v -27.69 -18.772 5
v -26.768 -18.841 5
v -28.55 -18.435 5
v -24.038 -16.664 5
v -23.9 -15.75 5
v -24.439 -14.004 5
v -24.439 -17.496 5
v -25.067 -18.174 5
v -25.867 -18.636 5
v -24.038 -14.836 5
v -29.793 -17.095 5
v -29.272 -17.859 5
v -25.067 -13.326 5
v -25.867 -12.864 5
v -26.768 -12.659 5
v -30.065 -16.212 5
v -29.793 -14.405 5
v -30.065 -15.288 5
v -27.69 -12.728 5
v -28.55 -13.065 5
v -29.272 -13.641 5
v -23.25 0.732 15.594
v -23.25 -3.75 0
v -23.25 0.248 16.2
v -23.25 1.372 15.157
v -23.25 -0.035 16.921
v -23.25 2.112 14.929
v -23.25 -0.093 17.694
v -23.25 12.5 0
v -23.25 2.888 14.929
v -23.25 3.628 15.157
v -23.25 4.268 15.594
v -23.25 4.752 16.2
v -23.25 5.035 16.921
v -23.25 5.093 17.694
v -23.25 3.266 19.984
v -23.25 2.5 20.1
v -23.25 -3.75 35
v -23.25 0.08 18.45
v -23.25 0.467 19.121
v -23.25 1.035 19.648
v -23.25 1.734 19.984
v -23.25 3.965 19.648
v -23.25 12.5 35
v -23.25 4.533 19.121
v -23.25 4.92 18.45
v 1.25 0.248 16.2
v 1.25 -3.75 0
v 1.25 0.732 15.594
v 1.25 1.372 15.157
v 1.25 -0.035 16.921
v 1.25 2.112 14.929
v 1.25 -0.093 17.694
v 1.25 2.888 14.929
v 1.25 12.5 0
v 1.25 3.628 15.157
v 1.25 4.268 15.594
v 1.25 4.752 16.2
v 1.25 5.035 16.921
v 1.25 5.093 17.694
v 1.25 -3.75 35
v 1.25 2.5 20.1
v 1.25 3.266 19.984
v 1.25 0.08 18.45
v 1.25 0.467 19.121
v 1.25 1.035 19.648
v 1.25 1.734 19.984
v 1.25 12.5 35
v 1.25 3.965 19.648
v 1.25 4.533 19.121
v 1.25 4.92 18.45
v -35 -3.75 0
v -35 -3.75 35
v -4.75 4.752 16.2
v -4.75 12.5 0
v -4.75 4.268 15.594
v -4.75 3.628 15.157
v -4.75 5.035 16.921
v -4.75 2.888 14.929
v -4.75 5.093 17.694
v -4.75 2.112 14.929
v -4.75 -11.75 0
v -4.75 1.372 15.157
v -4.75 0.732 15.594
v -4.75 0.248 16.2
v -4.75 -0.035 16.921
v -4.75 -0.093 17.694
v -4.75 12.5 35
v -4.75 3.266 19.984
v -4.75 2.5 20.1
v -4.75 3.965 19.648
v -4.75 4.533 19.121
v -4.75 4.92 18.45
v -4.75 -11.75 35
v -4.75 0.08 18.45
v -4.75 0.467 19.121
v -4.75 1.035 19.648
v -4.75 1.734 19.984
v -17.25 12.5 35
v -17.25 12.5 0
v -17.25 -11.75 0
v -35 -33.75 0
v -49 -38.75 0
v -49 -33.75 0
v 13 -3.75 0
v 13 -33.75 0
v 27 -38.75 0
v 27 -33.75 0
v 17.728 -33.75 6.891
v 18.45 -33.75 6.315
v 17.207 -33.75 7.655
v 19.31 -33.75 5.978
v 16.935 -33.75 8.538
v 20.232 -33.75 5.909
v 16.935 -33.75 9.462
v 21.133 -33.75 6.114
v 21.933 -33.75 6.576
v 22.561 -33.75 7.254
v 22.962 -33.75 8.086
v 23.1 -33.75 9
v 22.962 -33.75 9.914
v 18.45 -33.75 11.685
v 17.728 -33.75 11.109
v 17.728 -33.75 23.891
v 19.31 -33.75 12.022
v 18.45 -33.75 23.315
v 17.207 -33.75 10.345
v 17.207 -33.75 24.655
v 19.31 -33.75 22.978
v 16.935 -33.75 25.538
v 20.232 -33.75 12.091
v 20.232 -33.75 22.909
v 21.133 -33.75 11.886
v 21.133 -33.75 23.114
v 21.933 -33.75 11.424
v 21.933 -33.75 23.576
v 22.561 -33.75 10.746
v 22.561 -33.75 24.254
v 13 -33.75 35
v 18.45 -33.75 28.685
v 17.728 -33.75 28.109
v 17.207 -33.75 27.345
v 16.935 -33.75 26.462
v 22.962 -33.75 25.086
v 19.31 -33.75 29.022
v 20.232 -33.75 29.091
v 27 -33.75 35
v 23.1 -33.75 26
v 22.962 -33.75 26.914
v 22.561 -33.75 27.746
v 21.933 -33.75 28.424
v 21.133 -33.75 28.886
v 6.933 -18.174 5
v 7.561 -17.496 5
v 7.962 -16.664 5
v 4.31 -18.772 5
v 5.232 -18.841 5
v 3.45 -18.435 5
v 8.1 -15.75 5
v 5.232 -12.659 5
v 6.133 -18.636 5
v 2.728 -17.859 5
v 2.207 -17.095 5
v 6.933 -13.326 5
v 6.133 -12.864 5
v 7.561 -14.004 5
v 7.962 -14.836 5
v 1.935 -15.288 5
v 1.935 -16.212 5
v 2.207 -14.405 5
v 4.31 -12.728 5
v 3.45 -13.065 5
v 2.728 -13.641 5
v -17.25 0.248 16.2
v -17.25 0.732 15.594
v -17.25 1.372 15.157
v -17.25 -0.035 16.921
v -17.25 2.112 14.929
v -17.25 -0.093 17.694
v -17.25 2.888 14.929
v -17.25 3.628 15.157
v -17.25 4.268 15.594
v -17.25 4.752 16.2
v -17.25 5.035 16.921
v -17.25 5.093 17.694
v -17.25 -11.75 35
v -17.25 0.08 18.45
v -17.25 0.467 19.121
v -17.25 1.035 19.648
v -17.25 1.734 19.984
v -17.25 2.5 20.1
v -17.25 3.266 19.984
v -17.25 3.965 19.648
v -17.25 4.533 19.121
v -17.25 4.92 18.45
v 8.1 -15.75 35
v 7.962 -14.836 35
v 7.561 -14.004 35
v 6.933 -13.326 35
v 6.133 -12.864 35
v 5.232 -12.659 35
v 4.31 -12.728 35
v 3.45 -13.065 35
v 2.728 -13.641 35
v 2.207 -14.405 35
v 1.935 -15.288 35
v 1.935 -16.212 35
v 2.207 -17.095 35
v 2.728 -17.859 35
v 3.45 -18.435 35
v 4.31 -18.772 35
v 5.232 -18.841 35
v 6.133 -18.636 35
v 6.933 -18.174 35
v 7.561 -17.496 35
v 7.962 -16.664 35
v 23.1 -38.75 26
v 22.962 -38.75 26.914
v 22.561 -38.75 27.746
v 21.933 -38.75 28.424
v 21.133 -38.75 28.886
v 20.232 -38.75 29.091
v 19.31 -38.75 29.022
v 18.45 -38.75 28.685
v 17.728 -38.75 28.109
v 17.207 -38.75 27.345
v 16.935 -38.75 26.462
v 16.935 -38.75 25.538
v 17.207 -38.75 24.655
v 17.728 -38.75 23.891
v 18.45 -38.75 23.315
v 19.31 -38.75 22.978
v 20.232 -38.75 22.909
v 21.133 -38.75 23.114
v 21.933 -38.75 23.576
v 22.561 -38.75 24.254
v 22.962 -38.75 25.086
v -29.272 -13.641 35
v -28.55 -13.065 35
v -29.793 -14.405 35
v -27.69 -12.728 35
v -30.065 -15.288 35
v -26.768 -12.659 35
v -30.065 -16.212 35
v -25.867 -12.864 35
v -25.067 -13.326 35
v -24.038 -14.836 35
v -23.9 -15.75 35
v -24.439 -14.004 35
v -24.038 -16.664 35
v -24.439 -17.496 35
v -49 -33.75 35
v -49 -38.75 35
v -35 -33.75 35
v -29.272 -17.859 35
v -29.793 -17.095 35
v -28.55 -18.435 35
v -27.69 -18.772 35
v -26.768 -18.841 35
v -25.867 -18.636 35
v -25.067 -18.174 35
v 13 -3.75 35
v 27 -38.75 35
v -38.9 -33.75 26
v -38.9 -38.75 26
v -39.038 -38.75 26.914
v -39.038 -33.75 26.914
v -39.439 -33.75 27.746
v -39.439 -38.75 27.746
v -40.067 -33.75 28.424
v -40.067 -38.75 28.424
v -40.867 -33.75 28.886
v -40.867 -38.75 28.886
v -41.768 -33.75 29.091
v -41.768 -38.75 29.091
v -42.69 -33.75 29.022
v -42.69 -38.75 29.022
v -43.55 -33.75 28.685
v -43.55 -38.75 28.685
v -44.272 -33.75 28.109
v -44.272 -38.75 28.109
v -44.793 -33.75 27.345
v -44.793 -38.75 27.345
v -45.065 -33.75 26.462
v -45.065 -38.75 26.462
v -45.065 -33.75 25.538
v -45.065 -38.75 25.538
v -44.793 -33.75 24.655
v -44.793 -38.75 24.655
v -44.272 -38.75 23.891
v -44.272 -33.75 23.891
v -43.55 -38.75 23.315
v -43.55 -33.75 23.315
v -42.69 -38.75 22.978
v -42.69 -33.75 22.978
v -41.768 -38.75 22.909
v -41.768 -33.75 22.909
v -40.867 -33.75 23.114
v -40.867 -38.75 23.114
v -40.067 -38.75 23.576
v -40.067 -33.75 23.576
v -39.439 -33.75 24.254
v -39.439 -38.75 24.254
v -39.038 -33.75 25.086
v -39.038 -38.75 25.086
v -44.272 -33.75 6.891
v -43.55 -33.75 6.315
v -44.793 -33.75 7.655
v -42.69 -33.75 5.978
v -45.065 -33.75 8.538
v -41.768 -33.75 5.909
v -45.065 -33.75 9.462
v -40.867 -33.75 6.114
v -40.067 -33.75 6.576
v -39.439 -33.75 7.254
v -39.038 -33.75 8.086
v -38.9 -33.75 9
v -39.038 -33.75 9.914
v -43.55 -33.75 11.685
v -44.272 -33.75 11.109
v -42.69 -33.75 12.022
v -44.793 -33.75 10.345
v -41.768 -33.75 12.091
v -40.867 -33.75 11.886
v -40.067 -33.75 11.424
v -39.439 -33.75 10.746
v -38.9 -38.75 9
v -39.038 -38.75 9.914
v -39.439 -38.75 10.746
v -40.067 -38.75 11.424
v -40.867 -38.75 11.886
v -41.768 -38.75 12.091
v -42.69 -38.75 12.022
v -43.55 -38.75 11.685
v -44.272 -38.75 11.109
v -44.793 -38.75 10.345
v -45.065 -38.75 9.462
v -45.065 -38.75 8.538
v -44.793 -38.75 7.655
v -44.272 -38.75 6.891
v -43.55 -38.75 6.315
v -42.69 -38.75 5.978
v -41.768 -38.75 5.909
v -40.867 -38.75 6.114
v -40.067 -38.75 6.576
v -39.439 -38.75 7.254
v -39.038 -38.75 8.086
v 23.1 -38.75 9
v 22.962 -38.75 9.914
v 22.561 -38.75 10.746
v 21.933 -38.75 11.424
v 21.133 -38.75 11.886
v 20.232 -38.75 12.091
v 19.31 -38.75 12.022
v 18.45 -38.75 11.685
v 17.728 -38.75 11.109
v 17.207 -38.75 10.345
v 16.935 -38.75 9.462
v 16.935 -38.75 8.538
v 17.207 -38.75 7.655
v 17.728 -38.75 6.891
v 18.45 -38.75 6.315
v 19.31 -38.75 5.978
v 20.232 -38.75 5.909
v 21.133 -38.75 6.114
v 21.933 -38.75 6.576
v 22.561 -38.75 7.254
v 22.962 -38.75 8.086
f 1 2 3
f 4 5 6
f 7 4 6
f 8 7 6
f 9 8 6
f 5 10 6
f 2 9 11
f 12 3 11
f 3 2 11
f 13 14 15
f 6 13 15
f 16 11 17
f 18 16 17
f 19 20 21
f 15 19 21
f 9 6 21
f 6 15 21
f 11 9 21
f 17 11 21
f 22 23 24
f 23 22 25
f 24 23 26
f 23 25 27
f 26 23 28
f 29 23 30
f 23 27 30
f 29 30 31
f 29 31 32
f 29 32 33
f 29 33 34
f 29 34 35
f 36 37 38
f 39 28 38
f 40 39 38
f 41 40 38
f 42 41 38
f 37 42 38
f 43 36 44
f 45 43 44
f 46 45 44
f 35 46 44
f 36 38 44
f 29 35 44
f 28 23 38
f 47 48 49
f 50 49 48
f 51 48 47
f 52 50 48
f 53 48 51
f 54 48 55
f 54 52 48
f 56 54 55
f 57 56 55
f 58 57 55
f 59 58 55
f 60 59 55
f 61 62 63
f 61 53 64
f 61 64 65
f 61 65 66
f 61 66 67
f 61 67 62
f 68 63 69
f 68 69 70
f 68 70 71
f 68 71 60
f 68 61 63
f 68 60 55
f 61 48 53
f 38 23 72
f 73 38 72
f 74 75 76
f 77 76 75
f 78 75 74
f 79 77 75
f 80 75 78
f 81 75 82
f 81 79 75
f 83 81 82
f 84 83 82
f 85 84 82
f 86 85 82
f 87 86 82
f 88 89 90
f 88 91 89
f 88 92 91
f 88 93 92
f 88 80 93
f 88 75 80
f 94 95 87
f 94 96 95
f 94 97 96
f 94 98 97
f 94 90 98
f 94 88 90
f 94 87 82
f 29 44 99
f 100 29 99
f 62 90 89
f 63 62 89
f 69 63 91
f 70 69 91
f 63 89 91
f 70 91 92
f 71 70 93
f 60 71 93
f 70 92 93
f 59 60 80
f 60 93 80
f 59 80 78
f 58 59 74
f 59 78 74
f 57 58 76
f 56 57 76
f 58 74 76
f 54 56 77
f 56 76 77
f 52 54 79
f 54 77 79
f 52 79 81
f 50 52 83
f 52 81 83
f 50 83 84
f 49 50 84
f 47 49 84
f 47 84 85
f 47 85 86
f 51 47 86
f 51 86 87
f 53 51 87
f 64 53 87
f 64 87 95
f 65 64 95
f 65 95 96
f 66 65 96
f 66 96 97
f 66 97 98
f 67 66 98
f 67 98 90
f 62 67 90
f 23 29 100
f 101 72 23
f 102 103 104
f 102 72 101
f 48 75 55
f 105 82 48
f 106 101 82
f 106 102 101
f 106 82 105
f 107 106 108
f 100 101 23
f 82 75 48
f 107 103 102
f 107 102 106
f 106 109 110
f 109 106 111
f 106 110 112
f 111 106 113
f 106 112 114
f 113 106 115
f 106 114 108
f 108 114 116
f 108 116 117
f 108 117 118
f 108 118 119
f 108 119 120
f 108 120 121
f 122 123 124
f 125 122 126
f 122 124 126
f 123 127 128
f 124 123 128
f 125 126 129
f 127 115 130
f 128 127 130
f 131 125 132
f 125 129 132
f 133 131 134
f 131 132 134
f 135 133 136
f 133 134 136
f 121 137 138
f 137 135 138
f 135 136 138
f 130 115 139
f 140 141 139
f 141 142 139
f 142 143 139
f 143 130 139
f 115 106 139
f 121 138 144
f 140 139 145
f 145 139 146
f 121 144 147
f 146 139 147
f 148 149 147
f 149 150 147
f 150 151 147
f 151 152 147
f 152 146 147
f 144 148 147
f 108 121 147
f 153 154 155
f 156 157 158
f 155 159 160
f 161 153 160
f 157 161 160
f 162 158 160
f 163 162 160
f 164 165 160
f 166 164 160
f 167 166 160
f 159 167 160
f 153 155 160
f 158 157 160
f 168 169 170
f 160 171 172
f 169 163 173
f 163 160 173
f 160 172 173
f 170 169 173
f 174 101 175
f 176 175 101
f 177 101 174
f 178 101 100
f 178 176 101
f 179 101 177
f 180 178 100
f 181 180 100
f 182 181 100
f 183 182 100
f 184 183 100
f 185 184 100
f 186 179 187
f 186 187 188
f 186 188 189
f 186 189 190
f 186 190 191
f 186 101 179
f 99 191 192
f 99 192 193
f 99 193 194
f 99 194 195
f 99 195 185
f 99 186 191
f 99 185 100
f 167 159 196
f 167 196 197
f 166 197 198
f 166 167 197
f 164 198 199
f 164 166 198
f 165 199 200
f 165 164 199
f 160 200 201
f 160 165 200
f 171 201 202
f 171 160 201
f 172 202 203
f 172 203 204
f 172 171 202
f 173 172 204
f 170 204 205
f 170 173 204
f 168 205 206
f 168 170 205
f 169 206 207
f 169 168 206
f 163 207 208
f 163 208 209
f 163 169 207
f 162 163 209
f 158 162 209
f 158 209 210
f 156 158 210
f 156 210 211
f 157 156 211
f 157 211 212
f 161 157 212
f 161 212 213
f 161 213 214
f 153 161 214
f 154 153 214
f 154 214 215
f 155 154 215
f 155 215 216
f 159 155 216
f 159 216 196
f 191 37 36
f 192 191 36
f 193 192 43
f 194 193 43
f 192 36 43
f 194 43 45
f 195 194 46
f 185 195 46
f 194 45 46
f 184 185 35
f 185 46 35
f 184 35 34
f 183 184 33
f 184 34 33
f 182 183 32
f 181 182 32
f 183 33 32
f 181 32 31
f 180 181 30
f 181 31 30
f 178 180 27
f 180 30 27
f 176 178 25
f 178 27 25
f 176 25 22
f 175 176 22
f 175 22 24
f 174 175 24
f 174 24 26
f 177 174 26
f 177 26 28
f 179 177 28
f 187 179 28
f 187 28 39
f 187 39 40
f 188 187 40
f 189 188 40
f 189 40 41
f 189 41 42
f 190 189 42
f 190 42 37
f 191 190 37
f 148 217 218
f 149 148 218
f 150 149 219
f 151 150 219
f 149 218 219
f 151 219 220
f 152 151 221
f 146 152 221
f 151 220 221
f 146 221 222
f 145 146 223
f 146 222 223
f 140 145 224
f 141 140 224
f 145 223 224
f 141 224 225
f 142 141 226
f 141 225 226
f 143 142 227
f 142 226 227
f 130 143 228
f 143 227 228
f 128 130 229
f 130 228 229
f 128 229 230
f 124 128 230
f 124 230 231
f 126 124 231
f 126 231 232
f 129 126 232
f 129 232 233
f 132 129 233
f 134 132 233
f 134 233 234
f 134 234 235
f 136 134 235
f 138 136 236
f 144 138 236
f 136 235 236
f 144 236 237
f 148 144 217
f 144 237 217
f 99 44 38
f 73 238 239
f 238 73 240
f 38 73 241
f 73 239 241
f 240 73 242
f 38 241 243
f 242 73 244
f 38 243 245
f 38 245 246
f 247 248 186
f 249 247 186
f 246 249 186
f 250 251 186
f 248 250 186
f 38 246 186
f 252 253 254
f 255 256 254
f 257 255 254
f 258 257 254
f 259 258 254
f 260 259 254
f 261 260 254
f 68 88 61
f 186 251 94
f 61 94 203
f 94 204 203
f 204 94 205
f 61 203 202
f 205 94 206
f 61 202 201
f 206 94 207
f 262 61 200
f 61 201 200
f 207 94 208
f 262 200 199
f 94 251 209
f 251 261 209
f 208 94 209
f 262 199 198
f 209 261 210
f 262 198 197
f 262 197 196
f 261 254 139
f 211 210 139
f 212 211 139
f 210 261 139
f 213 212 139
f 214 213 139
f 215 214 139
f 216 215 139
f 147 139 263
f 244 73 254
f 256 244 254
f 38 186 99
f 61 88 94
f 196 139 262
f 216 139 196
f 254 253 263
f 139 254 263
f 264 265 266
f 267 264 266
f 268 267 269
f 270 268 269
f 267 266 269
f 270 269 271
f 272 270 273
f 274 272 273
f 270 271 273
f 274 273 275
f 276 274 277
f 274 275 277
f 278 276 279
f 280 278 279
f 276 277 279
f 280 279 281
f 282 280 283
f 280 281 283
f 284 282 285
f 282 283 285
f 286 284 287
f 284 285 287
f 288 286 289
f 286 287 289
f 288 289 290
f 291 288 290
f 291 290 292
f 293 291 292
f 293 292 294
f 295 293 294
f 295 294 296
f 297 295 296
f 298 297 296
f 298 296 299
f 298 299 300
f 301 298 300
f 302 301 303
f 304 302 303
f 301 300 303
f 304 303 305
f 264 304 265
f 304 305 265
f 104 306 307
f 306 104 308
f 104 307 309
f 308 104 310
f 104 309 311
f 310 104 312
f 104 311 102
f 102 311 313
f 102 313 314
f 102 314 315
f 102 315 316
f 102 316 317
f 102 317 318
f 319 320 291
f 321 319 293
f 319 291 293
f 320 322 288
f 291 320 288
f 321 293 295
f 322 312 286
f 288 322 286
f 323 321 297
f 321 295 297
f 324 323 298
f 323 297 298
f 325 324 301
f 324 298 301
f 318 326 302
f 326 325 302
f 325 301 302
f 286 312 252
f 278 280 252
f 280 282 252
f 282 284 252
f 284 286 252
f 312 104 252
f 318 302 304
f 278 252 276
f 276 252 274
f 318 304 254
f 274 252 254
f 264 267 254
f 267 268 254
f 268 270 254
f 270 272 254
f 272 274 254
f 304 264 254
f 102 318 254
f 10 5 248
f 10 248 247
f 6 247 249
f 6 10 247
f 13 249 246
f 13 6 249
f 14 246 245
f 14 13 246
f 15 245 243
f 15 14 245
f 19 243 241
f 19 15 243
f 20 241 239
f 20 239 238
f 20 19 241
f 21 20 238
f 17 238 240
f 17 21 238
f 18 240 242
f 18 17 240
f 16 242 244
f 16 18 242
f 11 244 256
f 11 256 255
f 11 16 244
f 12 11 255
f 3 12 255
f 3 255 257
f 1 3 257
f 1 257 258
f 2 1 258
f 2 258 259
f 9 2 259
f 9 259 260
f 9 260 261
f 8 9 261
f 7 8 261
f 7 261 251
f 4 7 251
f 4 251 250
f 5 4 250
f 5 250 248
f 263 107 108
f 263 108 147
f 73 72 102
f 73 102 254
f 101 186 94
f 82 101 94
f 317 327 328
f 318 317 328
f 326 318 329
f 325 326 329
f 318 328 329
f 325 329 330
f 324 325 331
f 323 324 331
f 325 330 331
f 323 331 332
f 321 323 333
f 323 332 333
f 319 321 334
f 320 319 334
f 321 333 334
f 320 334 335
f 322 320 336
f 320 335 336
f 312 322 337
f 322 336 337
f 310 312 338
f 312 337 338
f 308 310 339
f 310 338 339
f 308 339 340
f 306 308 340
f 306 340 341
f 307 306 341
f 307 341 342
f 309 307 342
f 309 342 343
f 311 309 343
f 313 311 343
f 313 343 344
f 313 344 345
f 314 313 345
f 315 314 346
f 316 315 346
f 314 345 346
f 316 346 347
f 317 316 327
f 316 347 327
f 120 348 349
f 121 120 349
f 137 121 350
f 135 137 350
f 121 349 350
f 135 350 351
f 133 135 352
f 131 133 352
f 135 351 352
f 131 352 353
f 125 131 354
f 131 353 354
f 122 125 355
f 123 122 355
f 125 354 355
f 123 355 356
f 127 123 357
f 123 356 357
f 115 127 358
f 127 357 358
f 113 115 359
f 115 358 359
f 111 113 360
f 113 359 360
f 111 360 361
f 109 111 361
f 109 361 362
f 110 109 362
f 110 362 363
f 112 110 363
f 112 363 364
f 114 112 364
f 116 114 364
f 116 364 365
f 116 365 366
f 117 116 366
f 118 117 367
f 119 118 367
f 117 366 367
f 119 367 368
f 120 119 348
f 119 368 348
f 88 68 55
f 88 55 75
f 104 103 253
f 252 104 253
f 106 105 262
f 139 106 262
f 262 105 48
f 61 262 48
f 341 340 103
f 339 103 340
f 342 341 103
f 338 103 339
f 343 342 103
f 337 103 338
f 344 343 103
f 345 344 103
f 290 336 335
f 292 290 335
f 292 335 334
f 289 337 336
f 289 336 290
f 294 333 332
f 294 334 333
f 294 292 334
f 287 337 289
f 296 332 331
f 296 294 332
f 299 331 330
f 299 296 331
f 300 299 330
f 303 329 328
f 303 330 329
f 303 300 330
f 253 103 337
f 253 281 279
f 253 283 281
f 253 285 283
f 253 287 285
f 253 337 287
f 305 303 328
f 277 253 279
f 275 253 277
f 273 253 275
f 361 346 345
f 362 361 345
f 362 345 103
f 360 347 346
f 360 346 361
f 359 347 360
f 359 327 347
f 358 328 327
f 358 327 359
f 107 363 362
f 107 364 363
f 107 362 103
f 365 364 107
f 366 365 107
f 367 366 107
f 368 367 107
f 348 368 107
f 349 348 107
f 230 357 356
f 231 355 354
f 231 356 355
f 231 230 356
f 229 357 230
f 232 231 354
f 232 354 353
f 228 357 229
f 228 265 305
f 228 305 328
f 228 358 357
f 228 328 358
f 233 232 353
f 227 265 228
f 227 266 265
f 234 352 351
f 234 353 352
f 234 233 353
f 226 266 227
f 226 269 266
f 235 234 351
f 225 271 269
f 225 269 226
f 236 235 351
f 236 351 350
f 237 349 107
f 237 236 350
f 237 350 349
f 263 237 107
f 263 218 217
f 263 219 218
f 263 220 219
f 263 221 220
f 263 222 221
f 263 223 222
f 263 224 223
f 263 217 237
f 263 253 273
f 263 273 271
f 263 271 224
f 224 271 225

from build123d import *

# Parameters (mm, degrees)
SKETCH1_R           = 3.1
BOSS_EXTRUDE1_DEPTH = 35
SKETCH2_R           = 3.1
BOSS_EXTRUDE2_DEPTH = 5
BOSS_EXTRUDE3_DEPTH = 35
SKETCH4_R           = 2.6
CUT_EXTRUDE1_DEPTH  = 37.25
SKETCH6_W           = 12.5
SKETCH6_H           = 8
CUT_EXTRUDE2_DEPTH  = 36
SKETCH7_W           = 48
SKETCH7_H           = 35
BOSS_EXTRUDE4_DEPTH = 10
SKETCH8_W           = 14
SKETCH8_H           = 35
SKETCH8_R           = 3.1
BOSS_EXTRUDE5_DEPTH = 5


with BuildPart() as part:
    # Sketch1 → Boss-Extrude1 (new body)
    with BuildSketch(Plane.XY):
        Polygon((-5, -3.75), (-35, -3.75), (-35, -28.75), (13, -28.75), (13, -3.75), align=None)
        with Locations((5, -15.75)):
            Circle(SKETCH1_R, mode=Mode.SUBTRACT)
        with Locations((-27, -15.75)):
            Circle(SKETCH1_R, mode=Mode.SUBTRACT)
    extrude(amount=BOSS_EXTRUDE1_DEPTH)

    # Sketch2 → Boss-Extrude2 (add)
    with BuildSketch(Plane(origin=(0, 0, 0), x_dir=(-1, 0, 0), z_dir=(0, 0, -1))):
        with Locations((27, -15.75)):
            Circle(SKETCH2_R)
        with Locations((-5, -15.75)):
            Circle(SKETCH2_R)
    extrude(amount=-BOSS_EXTRUDE2_DEPTH)

    # Sketch3 → Boss-Extrude3 (add)
    with BuildSketch(Plane.XY.offset(35)):
        Polygon((-17.25, 2.5), (-17.25, -7.5), (-23.25, -7.5), (-23.25, 12.5), (-17.25, 12.5), align=None)
        Polygon((-4.75, 2.5), (-4.75, -7.5), (1.25, -7.5), (1.25, 12.5), (-4.75, 12.5), align=None)
    extrude(amount=-BOSS_EXTRUDE3_DEPTH)

    # Sketch4 → Cut-Extrude1 (cut, through all)
    with BuildSketch(Plane.ZY.offset(23.25)):
        with Locations((17.5, 2.5)):
            Circle(SKETCH4_R)
    extrude(amount=-CUT_EXTRUDE1_DEPTH, mode=Mode.SUBTRACT)

    # Sketch6 → Cut-Extrude2 (cut, through all)
    with BuildSketch(Plane.XY.offset(35)):
        with Locations((-11, -7.75)):
            Rectangle(SKETCH6_W, SKETCH6_H)
    extrude(amount=-CUT_EXTRUDE2_DEPTH, mode=Mode.SUBTRACT)

    # Sketch7 → Boss-Extrude4 (add)
    with BuildSketch(Plane.XZ.offset(28.75)):
        with Locations((-11, 17.5)):
            Rectangle(SKETCH7_W, SKETCH7_H)
    extrude(amount=BOSS_EXTRUDE4_DEPTH)

    # Sketch8 → Boss-Extrude5 (add)
    with BuildSketch(Plane.XZ.offset(38.75)):
        with Locations((-42, 17.5)):
            Rectangle(SKETCH8_W, SKETCH8_H)
        with Locations((-42, 9)):
            Circle(SKETCH8_R, mode=Mode.SUBTRACT)
        with Locations((-42, 26)):
            Circle(SKETCH8_R, mode=Mode.SUBTRACT)
        with Locations((20, 17.5)):
            Rectangle(SKETCH8_W, SKETCH8_H)
        with Locations((20, 9)):
            Circle(SKETCH8_R, mode=Mode.SUBTRACT)
        with Locations((20, 26)):
            Circle(SKETCH8_R, mode=Mode.SUBTRACT)
    extrude(amount=-BOSS_EXTRUDE5_DEPTH)


solid = part.part
